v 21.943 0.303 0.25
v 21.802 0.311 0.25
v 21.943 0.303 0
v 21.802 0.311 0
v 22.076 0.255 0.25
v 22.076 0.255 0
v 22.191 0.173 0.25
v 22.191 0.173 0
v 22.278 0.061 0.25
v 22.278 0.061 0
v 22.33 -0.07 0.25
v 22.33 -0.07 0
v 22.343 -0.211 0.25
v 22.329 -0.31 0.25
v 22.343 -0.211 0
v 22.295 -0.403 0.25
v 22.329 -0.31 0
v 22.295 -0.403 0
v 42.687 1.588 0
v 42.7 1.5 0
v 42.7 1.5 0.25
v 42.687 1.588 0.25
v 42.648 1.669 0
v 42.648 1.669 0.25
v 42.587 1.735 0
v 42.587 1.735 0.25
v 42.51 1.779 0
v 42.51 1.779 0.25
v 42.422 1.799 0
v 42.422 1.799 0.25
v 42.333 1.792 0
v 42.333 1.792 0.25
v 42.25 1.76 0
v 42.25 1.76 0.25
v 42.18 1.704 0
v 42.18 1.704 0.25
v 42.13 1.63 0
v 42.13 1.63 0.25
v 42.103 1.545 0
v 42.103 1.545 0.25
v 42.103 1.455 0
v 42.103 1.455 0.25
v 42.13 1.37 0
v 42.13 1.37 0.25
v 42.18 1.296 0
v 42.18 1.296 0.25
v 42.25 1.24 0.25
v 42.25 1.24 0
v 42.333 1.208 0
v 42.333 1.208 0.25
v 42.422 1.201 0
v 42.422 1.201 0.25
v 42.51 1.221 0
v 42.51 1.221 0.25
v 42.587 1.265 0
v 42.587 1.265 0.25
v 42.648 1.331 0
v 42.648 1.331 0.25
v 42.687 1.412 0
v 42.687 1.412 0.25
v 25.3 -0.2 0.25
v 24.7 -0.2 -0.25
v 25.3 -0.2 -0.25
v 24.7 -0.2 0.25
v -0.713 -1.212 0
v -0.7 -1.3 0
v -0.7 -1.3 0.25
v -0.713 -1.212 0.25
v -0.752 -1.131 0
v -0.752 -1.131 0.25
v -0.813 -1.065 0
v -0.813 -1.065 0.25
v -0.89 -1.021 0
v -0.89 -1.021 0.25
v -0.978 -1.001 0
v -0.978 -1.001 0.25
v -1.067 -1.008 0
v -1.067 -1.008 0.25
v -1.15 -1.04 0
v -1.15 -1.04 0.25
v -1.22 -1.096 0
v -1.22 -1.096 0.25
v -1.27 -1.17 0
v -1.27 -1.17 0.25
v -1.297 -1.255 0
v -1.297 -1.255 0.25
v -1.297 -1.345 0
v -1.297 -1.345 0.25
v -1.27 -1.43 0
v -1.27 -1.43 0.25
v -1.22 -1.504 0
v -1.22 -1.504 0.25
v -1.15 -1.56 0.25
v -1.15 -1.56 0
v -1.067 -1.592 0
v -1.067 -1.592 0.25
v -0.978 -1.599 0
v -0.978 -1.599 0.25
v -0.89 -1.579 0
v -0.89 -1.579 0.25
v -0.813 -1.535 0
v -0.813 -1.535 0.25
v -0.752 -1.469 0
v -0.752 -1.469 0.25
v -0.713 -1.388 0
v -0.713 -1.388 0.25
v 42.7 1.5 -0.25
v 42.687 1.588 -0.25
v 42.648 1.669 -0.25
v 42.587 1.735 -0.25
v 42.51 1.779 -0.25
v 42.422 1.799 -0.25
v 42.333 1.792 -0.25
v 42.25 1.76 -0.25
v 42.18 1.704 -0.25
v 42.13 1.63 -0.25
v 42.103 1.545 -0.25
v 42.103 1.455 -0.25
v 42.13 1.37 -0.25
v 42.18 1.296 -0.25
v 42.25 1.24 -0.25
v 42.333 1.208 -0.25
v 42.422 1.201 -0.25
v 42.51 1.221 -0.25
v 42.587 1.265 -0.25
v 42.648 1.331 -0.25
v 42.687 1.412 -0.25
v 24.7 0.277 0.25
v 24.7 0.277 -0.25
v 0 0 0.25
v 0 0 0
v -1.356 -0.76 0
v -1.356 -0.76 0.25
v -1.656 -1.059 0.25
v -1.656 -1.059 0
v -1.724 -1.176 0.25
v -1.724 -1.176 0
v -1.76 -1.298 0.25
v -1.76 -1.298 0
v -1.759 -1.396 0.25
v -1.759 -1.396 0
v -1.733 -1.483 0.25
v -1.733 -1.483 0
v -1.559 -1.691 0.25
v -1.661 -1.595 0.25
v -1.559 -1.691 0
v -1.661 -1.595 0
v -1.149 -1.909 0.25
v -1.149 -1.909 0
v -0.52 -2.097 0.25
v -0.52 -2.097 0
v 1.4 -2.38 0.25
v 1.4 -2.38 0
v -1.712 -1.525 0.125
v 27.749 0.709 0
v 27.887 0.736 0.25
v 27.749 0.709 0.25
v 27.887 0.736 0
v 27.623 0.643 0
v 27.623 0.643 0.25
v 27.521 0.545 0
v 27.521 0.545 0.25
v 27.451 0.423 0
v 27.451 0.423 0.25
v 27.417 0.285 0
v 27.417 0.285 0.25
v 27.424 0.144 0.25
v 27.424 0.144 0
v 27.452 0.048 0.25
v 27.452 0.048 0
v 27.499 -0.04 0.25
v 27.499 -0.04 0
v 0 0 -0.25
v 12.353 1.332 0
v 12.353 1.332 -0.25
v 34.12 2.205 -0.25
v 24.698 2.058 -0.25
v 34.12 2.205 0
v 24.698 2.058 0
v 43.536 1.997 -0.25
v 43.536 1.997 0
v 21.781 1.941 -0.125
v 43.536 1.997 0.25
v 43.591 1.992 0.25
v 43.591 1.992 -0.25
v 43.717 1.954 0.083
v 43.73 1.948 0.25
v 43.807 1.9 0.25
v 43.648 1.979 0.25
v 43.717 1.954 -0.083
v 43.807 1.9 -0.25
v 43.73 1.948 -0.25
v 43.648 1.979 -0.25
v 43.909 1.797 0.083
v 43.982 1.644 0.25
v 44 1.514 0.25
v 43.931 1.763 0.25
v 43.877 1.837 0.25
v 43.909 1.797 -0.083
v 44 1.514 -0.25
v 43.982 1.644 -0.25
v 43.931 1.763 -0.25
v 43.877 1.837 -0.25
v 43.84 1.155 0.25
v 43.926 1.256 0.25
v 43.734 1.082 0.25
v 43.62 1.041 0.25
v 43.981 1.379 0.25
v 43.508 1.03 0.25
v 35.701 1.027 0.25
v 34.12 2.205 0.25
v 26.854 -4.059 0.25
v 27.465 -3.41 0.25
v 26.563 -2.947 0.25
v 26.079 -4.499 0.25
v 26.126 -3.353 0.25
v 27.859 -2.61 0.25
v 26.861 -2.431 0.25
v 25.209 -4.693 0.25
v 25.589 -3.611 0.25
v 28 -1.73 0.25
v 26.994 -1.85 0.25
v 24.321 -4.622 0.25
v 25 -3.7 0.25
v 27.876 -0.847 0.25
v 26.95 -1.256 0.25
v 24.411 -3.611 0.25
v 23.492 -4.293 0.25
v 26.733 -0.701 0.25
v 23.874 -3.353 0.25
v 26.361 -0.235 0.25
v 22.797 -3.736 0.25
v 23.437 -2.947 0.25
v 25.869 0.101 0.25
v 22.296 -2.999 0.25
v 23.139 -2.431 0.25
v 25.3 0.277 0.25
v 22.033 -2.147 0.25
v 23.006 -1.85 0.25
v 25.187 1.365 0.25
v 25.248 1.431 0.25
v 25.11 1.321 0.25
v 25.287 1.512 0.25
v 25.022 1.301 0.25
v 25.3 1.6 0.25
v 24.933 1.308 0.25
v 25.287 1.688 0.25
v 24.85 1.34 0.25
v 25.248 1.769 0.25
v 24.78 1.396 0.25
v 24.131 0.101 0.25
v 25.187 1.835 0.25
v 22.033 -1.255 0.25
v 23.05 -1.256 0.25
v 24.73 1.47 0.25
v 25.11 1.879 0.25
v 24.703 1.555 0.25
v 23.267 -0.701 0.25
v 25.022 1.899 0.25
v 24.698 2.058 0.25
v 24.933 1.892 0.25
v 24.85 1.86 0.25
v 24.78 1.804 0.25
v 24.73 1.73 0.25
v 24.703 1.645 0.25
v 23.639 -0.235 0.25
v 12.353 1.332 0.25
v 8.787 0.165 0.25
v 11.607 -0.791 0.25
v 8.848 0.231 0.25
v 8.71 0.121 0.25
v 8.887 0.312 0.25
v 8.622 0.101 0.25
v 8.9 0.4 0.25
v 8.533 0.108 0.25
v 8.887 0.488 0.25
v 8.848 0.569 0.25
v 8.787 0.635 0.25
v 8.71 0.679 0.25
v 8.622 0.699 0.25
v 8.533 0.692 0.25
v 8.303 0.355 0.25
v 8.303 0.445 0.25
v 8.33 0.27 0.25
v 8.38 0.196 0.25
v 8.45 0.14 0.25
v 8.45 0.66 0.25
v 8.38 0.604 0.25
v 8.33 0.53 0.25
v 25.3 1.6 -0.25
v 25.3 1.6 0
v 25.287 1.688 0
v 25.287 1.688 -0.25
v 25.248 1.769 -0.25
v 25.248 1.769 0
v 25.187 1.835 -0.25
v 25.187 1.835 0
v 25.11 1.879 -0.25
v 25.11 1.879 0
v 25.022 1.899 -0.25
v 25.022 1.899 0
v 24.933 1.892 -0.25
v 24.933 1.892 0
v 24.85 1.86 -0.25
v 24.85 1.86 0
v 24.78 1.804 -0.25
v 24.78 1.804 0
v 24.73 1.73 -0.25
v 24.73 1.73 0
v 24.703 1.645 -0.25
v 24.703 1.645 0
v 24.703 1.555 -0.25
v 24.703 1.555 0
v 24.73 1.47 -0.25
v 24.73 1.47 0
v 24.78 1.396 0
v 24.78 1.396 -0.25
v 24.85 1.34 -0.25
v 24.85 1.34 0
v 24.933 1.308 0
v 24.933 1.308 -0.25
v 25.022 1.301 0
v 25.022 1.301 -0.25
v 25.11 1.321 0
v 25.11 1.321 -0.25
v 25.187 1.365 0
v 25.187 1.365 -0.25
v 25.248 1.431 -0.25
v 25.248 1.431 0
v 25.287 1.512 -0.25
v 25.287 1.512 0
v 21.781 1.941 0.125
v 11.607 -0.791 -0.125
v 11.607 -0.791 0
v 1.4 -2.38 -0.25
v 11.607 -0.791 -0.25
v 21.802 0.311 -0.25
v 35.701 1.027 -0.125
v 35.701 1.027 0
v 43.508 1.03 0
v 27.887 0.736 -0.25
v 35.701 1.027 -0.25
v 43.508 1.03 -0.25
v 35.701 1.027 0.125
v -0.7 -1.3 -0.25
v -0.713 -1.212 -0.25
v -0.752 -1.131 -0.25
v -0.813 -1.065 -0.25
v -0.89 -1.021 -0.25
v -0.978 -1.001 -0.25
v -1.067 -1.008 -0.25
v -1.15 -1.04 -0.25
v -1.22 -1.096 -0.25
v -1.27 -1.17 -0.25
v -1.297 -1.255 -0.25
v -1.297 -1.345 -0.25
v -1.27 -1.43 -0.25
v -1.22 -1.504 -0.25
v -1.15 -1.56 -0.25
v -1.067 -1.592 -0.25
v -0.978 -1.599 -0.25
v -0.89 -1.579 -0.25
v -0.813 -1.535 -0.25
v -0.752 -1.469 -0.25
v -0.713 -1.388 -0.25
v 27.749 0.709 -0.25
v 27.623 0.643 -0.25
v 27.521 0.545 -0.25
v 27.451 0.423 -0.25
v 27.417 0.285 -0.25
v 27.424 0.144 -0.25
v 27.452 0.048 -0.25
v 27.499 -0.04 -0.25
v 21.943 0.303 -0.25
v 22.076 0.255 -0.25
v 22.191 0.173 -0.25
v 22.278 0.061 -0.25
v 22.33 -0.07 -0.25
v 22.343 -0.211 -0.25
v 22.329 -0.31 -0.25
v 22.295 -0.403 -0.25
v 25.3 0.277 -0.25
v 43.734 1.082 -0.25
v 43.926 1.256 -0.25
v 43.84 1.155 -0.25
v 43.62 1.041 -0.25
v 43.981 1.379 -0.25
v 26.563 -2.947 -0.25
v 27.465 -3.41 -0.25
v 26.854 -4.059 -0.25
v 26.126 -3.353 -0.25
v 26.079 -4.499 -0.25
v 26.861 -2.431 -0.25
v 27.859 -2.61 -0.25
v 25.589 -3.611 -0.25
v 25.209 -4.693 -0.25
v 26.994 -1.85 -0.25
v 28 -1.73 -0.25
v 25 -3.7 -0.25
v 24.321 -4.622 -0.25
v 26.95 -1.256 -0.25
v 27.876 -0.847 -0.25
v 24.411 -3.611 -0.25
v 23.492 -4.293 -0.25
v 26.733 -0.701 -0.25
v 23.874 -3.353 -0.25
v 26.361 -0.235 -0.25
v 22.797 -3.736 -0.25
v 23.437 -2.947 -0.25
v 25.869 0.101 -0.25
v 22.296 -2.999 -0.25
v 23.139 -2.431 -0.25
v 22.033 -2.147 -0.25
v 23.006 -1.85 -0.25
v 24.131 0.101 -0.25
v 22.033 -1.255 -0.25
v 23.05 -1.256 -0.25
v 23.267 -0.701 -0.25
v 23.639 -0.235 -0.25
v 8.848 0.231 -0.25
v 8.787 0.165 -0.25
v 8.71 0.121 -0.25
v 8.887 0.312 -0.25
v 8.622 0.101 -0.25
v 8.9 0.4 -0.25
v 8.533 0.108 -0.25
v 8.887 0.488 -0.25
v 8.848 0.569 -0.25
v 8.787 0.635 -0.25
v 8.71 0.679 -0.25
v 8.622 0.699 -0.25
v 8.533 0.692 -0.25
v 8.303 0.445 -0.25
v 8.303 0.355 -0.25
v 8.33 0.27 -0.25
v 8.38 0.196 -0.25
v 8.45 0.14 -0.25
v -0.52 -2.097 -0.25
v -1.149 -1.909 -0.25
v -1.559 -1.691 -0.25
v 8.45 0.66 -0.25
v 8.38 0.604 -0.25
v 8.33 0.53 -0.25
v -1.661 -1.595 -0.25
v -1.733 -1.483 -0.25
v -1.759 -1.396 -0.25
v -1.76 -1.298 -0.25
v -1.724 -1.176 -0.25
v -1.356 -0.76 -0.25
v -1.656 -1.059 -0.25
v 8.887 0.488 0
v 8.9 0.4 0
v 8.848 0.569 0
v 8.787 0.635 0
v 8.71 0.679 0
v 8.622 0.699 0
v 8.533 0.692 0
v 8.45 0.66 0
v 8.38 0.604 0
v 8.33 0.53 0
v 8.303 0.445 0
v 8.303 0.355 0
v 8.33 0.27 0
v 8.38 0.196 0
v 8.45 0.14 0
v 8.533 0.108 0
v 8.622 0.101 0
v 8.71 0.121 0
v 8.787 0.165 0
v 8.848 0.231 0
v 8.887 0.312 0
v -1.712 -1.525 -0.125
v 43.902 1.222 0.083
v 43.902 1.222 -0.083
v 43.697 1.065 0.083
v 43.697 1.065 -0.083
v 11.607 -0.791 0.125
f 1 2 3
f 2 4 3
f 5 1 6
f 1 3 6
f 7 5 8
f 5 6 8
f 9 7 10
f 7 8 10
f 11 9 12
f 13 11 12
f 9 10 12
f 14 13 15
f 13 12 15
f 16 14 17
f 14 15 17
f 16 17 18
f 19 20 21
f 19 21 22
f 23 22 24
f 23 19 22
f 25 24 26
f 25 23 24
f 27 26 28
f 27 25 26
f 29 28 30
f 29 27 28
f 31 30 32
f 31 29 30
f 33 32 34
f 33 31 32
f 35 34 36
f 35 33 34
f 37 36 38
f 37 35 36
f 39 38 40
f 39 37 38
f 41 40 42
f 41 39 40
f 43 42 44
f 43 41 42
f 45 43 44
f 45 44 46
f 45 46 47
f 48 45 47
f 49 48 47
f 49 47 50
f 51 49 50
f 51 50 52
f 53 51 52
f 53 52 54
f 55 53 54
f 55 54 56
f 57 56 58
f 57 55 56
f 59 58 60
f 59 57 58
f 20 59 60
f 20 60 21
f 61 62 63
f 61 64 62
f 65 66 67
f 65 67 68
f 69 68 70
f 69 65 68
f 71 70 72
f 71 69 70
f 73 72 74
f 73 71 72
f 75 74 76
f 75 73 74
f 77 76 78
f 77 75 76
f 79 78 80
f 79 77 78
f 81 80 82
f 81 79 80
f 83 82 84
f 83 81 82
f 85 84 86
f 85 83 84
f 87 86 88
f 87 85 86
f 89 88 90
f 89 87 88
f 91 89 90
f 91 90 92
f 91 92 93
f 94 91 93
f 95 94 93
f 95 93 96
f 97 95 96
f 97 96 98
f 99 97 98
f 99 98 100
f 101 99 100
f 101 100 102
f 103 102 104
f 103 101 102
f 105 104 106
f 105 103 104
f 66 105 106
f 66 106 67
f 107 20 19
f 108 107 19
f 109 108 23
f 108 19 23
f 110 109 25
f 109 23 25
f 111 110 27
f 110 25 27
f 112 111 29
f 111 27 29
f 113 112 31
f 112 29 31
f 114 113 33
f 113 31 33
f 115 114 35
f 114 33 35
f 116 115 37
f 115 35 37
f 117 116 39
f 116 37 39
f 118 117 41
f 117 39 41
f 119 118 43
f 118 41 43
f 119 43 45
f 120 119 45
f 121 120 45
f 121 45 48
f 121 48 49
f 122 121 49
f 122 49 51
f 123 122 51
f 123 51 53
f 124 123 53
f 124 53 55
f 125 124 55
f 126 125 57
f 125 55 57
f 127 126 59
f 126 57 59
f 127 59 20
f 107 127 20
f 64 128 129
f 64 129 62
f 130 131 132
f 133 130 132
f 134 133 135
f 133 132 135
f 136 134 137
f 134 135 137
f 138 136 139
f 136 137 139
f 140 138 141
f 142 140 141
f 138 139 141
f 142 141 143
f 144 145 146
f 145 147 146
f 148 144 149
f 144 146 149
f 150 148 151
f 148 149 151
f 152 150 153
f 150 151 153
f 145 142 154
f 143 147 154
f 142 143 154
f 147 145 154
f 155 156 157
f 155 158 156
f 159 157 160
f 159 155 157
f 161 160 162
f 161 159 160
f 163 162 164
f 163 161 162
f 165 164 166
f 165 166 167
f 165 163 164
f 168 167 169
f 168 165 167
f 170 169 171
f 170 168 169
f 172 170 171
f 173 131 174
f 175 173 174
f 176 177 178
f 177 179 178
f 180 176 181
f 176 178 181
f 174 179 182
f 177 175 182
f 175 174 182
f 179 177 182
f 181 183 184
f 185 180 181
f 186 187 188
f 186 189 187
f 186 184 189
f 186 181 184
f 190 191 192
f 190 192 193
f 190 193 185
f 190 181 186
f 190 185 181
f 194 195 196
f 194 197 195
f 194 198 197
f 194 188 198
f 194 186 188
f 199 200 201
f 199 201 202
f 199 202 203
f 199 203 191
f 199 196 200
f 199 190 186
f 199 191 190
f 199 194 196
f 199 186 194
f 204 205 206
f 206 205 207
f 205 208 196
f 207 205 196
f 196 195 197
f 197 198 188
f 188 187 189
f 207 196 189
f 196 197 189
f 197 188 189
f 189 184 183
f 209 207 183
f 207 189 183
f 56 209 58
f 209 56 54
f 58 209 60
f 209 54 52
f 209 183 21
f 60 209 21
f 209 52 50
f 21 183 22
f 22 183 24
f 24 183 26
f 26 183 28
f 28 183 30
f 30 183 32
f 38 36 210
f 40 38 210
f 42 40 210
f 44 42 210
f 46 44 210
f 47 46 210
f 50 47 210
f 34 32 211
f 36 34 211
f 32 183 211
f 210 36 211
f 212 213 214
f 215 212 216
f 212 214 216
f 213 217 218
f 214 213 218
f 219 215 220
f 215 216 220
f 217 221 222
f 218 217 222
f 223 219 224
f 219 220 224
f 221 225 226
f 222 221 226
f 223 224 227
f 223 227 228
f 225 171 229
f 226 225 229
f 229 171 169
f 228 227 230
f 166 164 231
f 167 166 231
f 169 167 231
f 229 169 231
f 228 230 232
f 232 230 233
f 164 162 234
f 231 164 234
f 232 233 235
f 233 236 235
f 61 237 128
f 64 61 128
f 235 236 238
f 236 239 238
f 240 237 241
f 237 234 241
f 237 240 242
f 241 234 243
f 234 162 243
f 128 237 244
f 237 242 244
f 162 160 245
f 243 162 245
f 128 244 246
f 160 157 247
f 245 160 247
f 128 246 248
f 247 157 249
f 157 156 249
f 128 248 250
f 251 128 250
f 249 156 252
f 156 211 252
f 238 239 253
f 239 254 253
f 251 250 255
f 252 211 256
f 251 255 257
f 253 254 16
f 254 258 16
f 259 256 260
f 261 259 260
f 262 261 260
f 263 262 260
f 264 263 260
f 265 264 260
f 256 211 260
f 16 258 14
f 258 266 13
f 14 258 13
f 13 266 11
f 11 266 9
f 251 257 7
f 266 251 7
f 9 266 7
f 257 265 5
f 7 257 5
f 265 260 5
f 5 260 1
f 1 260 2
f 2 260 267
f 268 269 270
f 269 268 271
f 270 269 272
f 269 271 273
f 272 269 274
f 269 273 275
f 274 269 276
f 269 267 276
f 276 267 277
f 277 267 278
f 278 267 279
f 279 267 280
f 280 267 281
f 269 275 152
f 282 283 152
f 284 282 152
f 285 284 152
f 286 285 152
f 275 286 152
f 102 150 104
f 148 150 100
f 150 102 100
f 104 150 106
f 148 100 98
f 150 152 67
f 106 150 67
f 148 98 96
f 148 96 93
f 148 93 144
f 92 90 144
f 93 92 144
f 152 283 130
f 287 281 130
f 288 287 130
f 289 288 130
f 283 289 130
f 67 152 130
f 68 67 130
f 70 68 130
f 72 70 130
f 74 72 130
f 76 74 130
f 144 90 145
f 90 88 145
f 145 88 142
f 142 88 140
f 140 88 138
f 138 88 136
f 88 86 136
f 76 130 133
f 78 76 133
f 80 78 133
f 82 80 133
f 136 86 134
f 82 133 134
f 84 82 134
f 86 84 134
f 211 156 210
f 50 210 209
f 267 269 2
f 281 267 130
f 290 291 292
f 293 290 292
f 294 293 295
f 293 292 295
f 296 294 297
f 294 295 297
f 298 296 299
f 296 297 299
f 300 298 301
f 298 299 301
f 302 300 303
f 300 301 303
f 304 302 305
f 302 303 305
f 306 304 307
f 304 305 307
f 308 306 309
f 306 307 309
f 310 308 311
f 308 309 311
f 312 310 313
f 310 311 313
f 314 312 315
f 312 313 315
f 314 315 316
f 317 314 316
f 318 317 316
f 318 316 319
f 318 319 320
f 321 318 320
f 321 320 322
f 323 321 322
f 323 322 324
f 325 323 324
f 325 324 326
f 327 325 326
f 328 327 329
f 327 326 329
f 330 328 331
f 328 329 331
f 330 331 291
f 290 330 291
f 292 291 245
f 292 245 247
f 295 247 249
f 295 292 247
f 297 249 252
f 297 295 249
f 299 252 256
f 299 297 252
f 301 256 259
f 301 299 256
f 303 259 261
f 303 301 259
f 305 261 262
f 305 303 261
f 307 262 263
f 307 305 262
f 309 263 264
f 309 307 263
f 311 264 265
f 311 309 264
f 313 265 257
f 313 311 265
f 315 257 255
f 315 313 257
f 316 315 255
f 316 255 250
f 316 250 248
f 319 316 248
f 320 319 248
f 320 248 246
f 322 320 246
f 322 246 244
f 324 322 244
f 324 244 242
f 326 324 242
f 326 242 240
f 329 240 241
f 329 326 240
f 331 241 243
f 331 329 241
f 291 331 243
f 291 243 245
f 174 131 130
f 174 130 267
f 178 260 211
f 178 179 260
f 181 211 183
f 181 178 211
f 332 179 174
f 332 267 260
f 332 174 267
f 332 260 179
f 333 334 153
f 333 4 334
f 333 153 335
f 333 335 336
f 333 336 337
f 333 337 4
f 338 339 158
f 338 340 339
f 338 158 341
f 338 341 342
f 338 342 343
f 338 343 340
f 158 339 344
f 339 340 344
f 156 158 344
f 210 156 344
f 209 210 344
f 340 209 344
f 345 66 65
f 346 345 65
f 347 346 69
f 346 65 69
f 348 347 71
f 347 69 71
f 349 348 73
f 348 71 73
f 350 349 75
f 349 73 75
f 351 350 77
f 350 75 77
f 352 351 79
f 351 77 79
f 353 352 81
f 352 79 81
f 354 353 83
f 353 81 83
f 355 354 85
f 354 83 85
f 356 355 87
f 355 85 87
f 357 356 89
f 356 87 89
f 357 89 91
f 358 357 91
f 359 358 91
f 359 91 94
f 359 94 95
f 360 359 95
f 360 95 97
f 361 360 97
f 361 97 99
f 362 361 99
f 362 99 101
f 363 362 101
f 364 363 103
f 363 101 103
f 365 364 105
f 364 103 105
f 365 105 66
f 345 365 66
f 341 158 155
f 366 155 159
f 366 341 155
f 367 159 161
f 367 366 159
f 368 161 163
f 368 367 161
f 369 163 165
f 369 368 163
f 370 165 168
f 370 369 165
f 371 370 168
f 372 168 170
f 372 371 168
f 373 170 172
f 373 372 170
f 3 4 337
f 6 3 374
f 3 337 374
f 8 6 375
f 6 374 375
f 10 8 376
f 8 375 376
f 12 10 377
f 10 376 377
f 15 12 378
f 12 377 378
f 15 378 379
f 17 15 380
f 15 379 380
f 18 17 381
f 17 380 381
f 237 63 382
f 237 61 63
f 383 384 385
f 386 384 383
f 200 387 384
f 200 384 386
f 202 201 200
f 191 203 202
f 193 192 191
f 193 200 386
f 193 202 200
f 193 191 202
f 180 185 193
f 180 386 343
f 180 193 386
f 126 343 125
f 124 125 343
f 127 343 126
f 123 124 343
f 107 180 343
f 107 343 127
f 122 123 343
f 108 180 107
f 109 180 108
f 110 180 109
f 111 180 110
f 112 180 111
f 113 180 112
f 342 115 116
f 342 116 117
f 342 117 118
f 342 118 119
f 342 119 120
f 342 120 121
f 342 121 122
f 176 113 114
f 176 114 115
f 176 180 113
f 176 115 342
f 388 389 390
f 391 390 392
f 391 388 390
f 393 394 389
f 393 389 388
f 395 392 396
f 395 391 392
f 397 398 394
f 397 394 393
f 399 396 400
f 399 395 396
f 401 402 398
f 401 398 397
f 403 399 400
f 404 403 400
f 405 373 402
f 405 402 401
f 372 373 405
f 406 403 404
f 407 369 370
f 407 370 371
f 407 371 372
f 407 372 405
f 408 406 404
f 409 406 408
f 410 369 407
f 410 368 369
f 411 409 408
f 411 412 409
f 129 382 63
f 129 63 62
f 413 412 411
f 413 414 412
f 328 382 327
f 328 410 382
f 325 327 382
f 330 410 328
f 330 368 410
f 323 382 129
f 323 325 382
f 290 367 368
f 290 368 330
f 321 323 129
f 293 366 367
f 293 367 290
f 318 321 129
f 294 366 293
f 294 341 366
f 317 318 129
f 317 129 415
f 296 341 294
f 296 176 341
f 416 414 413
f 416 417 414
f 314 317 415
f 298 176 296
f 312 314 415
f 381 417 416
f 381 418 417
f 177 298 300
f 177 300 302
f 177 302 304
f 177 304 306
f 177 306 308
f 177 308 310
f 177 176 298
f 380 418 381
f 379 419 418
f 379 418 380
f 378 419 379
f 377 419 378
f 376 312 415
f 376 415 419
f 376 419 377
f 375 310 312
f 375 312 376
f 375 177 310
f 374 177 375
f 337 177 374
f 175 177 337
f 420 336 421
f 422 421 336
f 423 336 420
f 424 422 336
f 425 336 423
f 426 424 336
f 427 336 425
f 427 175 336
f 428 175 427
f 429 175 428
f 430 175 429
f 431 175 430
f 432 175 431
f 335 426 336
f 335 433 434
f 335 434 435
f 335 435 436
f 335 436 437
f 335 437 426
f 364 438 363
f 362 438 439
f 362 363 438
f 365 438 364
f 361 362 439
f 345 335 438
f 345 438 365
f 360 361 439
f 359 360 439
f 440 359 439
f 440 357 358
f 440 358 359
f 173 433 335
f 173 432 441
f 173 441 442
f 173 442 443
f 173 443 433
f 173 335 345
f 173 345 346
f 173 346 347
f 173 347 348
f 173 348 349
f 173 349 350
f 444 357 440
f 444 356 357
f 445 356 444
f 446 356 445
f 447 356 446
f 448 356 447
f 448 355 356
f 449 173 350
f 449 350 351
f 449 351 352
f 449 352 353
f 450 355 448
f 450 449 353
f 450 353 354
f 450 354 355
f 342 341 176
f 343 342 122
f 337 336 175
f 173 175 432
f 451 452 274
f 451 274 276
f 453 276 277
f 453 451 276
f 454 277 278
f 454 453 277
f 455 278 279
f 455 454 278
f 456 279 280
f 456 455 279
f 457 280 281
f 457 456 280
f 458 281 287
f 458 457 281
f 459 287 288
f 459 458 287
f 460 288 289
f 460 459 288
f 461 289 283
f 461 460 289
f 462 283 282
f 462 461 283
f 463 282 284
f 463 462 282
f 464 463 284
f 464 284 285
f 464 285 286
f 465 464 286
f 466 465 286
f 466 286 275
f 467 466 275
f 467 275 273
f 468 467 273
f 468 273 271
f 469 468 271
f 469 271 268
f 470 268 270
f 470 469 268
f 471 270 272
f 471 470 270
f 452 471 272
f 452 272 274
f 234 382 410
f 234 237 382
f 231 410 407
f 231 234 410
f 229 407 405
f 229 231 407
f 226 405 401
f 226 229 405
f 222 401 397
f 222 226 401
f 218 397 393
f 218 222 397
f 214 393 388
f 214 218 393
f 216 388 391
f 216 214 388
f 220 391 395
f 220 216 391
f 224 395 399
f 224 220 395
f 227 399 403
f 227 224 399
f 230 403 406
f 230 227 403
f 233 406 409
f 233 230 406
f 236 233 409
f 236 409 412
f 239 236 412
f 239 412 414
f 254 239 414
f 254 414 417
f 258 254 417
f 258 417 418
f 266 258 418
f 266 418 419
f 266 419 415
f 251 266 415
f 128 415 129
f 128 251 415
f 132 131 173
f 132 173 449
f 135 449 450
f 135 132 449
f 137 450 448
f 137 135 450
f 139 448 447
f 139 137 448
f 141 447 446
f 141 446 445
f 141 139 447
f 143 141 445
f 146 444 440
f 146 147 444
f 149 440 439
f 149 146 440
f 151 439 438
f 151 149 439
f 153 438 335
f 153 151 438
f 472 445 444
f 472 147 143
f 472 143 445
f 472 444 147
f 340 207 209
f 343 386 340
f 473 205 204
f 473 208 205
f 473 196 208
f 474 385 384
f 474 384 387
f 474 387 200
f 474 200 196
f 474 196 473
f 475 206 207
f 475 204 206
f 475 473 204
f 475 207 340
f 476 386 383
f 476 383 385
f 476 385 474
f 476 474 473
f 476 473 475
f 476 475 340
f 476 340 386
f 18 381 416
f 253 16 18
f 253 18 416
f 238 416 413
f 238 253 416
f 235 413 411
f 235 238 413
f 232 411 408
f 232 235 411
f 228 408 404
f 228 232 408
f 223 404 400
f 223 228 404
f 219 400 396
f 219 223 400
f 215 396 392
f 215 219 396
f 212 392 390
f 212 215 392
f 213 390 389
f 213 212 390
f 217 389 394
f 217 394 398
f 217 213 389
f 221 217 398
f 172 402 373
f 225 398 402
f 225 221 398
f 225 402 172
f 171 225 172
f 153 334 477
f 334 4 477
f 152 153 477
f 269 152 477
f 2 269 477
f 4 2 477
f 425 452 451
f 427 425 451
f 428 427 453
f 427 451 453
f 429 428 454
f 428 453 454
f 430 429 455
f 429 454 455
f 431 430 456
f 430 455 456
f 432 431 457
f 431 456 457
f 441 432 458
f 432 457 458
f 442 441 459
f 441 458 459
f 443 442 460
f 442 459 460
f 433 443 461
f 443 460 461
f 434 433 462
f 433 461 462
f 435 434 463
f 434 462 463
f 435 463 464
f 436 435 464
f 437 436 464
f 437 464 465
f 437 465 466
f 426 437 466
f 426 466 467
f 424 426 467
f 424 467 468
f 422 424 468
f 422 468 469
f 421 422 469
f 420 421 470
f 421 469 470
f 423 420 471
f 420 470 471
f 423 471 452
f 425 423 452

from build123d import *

# Parameters (mm, degrees)
EXTRUDE_1_DEPTH     = 0.25
SKETCH_3_R          = 0.3
SKETCH_3_R_2        = 0.2
CUT_EXTRUDE_1_DEPTH = 0.25
EXTRUDE_2_DEPTH     = 0.25
FILLET_1_R          = 0.5
SKETCH_5_W          = 70.035704888
SKETCH_5_H          = 36.253776648
CUT_EXTRUDE_2_DEPTH = 0.25
FILLET_START        = -1
FILLET_2_DEPTH      = 2


with BuildPart() as part:
    # 草图2 → 凸台-拉伸1 (new, symmetric)
    with BuildSketch(Plane.XY):
        with BuildLine():
            ThreePointArc((94.3, -5.23), (94.279085645, -5.63954323), (94, -5.94))
            add(Edge.make_bspline(
                [(1.4, -2.38), (47.954561827, 5.976867864), (94, -5.94)],
                knots=[0, 0, 0, 1, 1, 1], degree=2))
            add(Edge.make_bspline(
                [(0, 0), (-4.123736473, -1.859487618), (1.4, -2.38)],
                knots=[0, 0, 0, 1, 1, 1], degree=2))
            add(Edge.make_bspline(
                [(0, 0), (47.273266317, 6.255778848), (94.3, -5.23)],
                knots=[0, 0, 0, 1, 1, 1], degree=2))
        make_face()
    extrude(amount=EXTRUDE_1_DEPTH, both=True)

    # 草图3 → 切除-拉伸1 (cut, symmetric)
    with BuildSketch(Plane.XY):
        with Locations((-1, -1.3)):
            Circle(SKETCH_3_R)
        with Locations((8.6, 0.4)):
            Circle(SKETCH_3_R)
        with Locations((25, 1.6)):
            Circle(SKETCH_3_R)
        with Locations((42.4, 1.5)):
            Circle(SKETCH_3_R)
        with Locations((68, -0.5)):
            Circle(SKETCH_3_R_2)
        with Locations((93.8, -5.5)):
            Circle(SKETCH_3_R_2)
    extrude(amount=CUT_EXTRUDE_1_DEPTH, both=True, mode=Mode.SUBTRACT)

    # 草图4 → 凸台-拉伸2 (add, symmetric)
    with BuildSketch(Plane.XY):
        with BuildLine():
            ThreePointArc((22.854587938, 0.396951856), (25.20918356, -4.692698154), (26.83283005, 0.675022949))
            add(Edge.make_bspline(
                [(22.854587938, 0.396951856), (24.844176287, 0.554595418), (26.83283005, 0.675022949)],
                knots=[0, 0, 0, 1, 1, 1], degree=2))
        make_face()
        with BuildLine():
            Line((24.7, 0.277371993), (24.7, -0.2))
            Line((24.7, -0.2), (25.3, -0.2))
            Line((25.3, -0.2), (25.3, 0.277371993))
            ThreePointArc((25.3, 0.277371993), (25, -3.7), (24.7, 0.277371993))
        make_face(mode=Mode.SUBTRACT)
    extrude(amount=EXTRUDE_2_DEPTH, both=True)

    # 圆角1
    fillet_1_edges = [part.edges().sort_by_distance(p)[0] for p in [
        (26.83283005, 0.675022949, -0.125),
        (22.854587938, 0.396951856, -0.125),
    ]]
    fillet(fillet_1_edges, radius=FILLET_1_R)

    # 草图5 → 切除-拉伸2 (cut, symmetric)
    with BuildSketch(Plane.XY):
        with Locations((79.017852444, -9.233575246)):
            Rectangle(SKETCH_5_W, SKETCH_5_H)
    extrude(amount=CUT_EXTRUDE_2_DEPTH, both=True, mode=Mode.SUBTRACT)

    # 圆角2: read off the stored shape, not the designer's step
    # 圆角2 outline → 圆角2 (cut)
    with BuildSketch(Plane.XY.offset(FILLET_START)):
        with BuildLine():
            add(Edge.make_bspline(
                [(44, 1.977919753), (43.768012094, 1.987811641), (43.536018221, 1.997274187)],
                knots=[0.534054584, 0.534054584, 0.534054584, 0.538973918, 0.538973918, 0.538973918], degree=2))
            add(Edge.make_bspline(
                [(43.536018221, 1.997274187), (43.770994303, 1.987690003), (44.000000033, 1.825022881), (44, 1.513981716)],
                knots=[0, 0, 0, 0, 0.492568205, 0.492568205, 0.492568205, 0.492568205], degree=3, weights=[1, 0.675356893, 0.510622658, 0.505797296]))
            Line((44, 1.513981716), (44, 1.977919753))
        make_face()
        with BuildLine():
            Line((44, 1.020922578), (44, 1.513981716))
            add(Edge.make_bspline(
                [(44, 1.513981716), (43.999999965, 1.187287005), (43.753387643, 1.02593813), (43.507593676, 1.030365965)],
                knots=[0.492568205, 0.492568205, 0.492568205, 0.492568205, 1, 1, 1, 1], degree=3, weights=[0.505797296, 0.500826325, 0.66556056, 1]))
            add(Edge.make_bspline(
                [(43.507593676, 1.030365965), (43.753804029, 1.025930629), (44, 1.020922578)],
                knots=[0.453363068, 0.453363068, 0.453363068, 0.458678061, 0.458678061, 0.458678061], degree=2))
        make_face()
    extrude(amount=FILLET_2_DEPTH, mode=Mode.SUBTRACT)


solid = part.part
